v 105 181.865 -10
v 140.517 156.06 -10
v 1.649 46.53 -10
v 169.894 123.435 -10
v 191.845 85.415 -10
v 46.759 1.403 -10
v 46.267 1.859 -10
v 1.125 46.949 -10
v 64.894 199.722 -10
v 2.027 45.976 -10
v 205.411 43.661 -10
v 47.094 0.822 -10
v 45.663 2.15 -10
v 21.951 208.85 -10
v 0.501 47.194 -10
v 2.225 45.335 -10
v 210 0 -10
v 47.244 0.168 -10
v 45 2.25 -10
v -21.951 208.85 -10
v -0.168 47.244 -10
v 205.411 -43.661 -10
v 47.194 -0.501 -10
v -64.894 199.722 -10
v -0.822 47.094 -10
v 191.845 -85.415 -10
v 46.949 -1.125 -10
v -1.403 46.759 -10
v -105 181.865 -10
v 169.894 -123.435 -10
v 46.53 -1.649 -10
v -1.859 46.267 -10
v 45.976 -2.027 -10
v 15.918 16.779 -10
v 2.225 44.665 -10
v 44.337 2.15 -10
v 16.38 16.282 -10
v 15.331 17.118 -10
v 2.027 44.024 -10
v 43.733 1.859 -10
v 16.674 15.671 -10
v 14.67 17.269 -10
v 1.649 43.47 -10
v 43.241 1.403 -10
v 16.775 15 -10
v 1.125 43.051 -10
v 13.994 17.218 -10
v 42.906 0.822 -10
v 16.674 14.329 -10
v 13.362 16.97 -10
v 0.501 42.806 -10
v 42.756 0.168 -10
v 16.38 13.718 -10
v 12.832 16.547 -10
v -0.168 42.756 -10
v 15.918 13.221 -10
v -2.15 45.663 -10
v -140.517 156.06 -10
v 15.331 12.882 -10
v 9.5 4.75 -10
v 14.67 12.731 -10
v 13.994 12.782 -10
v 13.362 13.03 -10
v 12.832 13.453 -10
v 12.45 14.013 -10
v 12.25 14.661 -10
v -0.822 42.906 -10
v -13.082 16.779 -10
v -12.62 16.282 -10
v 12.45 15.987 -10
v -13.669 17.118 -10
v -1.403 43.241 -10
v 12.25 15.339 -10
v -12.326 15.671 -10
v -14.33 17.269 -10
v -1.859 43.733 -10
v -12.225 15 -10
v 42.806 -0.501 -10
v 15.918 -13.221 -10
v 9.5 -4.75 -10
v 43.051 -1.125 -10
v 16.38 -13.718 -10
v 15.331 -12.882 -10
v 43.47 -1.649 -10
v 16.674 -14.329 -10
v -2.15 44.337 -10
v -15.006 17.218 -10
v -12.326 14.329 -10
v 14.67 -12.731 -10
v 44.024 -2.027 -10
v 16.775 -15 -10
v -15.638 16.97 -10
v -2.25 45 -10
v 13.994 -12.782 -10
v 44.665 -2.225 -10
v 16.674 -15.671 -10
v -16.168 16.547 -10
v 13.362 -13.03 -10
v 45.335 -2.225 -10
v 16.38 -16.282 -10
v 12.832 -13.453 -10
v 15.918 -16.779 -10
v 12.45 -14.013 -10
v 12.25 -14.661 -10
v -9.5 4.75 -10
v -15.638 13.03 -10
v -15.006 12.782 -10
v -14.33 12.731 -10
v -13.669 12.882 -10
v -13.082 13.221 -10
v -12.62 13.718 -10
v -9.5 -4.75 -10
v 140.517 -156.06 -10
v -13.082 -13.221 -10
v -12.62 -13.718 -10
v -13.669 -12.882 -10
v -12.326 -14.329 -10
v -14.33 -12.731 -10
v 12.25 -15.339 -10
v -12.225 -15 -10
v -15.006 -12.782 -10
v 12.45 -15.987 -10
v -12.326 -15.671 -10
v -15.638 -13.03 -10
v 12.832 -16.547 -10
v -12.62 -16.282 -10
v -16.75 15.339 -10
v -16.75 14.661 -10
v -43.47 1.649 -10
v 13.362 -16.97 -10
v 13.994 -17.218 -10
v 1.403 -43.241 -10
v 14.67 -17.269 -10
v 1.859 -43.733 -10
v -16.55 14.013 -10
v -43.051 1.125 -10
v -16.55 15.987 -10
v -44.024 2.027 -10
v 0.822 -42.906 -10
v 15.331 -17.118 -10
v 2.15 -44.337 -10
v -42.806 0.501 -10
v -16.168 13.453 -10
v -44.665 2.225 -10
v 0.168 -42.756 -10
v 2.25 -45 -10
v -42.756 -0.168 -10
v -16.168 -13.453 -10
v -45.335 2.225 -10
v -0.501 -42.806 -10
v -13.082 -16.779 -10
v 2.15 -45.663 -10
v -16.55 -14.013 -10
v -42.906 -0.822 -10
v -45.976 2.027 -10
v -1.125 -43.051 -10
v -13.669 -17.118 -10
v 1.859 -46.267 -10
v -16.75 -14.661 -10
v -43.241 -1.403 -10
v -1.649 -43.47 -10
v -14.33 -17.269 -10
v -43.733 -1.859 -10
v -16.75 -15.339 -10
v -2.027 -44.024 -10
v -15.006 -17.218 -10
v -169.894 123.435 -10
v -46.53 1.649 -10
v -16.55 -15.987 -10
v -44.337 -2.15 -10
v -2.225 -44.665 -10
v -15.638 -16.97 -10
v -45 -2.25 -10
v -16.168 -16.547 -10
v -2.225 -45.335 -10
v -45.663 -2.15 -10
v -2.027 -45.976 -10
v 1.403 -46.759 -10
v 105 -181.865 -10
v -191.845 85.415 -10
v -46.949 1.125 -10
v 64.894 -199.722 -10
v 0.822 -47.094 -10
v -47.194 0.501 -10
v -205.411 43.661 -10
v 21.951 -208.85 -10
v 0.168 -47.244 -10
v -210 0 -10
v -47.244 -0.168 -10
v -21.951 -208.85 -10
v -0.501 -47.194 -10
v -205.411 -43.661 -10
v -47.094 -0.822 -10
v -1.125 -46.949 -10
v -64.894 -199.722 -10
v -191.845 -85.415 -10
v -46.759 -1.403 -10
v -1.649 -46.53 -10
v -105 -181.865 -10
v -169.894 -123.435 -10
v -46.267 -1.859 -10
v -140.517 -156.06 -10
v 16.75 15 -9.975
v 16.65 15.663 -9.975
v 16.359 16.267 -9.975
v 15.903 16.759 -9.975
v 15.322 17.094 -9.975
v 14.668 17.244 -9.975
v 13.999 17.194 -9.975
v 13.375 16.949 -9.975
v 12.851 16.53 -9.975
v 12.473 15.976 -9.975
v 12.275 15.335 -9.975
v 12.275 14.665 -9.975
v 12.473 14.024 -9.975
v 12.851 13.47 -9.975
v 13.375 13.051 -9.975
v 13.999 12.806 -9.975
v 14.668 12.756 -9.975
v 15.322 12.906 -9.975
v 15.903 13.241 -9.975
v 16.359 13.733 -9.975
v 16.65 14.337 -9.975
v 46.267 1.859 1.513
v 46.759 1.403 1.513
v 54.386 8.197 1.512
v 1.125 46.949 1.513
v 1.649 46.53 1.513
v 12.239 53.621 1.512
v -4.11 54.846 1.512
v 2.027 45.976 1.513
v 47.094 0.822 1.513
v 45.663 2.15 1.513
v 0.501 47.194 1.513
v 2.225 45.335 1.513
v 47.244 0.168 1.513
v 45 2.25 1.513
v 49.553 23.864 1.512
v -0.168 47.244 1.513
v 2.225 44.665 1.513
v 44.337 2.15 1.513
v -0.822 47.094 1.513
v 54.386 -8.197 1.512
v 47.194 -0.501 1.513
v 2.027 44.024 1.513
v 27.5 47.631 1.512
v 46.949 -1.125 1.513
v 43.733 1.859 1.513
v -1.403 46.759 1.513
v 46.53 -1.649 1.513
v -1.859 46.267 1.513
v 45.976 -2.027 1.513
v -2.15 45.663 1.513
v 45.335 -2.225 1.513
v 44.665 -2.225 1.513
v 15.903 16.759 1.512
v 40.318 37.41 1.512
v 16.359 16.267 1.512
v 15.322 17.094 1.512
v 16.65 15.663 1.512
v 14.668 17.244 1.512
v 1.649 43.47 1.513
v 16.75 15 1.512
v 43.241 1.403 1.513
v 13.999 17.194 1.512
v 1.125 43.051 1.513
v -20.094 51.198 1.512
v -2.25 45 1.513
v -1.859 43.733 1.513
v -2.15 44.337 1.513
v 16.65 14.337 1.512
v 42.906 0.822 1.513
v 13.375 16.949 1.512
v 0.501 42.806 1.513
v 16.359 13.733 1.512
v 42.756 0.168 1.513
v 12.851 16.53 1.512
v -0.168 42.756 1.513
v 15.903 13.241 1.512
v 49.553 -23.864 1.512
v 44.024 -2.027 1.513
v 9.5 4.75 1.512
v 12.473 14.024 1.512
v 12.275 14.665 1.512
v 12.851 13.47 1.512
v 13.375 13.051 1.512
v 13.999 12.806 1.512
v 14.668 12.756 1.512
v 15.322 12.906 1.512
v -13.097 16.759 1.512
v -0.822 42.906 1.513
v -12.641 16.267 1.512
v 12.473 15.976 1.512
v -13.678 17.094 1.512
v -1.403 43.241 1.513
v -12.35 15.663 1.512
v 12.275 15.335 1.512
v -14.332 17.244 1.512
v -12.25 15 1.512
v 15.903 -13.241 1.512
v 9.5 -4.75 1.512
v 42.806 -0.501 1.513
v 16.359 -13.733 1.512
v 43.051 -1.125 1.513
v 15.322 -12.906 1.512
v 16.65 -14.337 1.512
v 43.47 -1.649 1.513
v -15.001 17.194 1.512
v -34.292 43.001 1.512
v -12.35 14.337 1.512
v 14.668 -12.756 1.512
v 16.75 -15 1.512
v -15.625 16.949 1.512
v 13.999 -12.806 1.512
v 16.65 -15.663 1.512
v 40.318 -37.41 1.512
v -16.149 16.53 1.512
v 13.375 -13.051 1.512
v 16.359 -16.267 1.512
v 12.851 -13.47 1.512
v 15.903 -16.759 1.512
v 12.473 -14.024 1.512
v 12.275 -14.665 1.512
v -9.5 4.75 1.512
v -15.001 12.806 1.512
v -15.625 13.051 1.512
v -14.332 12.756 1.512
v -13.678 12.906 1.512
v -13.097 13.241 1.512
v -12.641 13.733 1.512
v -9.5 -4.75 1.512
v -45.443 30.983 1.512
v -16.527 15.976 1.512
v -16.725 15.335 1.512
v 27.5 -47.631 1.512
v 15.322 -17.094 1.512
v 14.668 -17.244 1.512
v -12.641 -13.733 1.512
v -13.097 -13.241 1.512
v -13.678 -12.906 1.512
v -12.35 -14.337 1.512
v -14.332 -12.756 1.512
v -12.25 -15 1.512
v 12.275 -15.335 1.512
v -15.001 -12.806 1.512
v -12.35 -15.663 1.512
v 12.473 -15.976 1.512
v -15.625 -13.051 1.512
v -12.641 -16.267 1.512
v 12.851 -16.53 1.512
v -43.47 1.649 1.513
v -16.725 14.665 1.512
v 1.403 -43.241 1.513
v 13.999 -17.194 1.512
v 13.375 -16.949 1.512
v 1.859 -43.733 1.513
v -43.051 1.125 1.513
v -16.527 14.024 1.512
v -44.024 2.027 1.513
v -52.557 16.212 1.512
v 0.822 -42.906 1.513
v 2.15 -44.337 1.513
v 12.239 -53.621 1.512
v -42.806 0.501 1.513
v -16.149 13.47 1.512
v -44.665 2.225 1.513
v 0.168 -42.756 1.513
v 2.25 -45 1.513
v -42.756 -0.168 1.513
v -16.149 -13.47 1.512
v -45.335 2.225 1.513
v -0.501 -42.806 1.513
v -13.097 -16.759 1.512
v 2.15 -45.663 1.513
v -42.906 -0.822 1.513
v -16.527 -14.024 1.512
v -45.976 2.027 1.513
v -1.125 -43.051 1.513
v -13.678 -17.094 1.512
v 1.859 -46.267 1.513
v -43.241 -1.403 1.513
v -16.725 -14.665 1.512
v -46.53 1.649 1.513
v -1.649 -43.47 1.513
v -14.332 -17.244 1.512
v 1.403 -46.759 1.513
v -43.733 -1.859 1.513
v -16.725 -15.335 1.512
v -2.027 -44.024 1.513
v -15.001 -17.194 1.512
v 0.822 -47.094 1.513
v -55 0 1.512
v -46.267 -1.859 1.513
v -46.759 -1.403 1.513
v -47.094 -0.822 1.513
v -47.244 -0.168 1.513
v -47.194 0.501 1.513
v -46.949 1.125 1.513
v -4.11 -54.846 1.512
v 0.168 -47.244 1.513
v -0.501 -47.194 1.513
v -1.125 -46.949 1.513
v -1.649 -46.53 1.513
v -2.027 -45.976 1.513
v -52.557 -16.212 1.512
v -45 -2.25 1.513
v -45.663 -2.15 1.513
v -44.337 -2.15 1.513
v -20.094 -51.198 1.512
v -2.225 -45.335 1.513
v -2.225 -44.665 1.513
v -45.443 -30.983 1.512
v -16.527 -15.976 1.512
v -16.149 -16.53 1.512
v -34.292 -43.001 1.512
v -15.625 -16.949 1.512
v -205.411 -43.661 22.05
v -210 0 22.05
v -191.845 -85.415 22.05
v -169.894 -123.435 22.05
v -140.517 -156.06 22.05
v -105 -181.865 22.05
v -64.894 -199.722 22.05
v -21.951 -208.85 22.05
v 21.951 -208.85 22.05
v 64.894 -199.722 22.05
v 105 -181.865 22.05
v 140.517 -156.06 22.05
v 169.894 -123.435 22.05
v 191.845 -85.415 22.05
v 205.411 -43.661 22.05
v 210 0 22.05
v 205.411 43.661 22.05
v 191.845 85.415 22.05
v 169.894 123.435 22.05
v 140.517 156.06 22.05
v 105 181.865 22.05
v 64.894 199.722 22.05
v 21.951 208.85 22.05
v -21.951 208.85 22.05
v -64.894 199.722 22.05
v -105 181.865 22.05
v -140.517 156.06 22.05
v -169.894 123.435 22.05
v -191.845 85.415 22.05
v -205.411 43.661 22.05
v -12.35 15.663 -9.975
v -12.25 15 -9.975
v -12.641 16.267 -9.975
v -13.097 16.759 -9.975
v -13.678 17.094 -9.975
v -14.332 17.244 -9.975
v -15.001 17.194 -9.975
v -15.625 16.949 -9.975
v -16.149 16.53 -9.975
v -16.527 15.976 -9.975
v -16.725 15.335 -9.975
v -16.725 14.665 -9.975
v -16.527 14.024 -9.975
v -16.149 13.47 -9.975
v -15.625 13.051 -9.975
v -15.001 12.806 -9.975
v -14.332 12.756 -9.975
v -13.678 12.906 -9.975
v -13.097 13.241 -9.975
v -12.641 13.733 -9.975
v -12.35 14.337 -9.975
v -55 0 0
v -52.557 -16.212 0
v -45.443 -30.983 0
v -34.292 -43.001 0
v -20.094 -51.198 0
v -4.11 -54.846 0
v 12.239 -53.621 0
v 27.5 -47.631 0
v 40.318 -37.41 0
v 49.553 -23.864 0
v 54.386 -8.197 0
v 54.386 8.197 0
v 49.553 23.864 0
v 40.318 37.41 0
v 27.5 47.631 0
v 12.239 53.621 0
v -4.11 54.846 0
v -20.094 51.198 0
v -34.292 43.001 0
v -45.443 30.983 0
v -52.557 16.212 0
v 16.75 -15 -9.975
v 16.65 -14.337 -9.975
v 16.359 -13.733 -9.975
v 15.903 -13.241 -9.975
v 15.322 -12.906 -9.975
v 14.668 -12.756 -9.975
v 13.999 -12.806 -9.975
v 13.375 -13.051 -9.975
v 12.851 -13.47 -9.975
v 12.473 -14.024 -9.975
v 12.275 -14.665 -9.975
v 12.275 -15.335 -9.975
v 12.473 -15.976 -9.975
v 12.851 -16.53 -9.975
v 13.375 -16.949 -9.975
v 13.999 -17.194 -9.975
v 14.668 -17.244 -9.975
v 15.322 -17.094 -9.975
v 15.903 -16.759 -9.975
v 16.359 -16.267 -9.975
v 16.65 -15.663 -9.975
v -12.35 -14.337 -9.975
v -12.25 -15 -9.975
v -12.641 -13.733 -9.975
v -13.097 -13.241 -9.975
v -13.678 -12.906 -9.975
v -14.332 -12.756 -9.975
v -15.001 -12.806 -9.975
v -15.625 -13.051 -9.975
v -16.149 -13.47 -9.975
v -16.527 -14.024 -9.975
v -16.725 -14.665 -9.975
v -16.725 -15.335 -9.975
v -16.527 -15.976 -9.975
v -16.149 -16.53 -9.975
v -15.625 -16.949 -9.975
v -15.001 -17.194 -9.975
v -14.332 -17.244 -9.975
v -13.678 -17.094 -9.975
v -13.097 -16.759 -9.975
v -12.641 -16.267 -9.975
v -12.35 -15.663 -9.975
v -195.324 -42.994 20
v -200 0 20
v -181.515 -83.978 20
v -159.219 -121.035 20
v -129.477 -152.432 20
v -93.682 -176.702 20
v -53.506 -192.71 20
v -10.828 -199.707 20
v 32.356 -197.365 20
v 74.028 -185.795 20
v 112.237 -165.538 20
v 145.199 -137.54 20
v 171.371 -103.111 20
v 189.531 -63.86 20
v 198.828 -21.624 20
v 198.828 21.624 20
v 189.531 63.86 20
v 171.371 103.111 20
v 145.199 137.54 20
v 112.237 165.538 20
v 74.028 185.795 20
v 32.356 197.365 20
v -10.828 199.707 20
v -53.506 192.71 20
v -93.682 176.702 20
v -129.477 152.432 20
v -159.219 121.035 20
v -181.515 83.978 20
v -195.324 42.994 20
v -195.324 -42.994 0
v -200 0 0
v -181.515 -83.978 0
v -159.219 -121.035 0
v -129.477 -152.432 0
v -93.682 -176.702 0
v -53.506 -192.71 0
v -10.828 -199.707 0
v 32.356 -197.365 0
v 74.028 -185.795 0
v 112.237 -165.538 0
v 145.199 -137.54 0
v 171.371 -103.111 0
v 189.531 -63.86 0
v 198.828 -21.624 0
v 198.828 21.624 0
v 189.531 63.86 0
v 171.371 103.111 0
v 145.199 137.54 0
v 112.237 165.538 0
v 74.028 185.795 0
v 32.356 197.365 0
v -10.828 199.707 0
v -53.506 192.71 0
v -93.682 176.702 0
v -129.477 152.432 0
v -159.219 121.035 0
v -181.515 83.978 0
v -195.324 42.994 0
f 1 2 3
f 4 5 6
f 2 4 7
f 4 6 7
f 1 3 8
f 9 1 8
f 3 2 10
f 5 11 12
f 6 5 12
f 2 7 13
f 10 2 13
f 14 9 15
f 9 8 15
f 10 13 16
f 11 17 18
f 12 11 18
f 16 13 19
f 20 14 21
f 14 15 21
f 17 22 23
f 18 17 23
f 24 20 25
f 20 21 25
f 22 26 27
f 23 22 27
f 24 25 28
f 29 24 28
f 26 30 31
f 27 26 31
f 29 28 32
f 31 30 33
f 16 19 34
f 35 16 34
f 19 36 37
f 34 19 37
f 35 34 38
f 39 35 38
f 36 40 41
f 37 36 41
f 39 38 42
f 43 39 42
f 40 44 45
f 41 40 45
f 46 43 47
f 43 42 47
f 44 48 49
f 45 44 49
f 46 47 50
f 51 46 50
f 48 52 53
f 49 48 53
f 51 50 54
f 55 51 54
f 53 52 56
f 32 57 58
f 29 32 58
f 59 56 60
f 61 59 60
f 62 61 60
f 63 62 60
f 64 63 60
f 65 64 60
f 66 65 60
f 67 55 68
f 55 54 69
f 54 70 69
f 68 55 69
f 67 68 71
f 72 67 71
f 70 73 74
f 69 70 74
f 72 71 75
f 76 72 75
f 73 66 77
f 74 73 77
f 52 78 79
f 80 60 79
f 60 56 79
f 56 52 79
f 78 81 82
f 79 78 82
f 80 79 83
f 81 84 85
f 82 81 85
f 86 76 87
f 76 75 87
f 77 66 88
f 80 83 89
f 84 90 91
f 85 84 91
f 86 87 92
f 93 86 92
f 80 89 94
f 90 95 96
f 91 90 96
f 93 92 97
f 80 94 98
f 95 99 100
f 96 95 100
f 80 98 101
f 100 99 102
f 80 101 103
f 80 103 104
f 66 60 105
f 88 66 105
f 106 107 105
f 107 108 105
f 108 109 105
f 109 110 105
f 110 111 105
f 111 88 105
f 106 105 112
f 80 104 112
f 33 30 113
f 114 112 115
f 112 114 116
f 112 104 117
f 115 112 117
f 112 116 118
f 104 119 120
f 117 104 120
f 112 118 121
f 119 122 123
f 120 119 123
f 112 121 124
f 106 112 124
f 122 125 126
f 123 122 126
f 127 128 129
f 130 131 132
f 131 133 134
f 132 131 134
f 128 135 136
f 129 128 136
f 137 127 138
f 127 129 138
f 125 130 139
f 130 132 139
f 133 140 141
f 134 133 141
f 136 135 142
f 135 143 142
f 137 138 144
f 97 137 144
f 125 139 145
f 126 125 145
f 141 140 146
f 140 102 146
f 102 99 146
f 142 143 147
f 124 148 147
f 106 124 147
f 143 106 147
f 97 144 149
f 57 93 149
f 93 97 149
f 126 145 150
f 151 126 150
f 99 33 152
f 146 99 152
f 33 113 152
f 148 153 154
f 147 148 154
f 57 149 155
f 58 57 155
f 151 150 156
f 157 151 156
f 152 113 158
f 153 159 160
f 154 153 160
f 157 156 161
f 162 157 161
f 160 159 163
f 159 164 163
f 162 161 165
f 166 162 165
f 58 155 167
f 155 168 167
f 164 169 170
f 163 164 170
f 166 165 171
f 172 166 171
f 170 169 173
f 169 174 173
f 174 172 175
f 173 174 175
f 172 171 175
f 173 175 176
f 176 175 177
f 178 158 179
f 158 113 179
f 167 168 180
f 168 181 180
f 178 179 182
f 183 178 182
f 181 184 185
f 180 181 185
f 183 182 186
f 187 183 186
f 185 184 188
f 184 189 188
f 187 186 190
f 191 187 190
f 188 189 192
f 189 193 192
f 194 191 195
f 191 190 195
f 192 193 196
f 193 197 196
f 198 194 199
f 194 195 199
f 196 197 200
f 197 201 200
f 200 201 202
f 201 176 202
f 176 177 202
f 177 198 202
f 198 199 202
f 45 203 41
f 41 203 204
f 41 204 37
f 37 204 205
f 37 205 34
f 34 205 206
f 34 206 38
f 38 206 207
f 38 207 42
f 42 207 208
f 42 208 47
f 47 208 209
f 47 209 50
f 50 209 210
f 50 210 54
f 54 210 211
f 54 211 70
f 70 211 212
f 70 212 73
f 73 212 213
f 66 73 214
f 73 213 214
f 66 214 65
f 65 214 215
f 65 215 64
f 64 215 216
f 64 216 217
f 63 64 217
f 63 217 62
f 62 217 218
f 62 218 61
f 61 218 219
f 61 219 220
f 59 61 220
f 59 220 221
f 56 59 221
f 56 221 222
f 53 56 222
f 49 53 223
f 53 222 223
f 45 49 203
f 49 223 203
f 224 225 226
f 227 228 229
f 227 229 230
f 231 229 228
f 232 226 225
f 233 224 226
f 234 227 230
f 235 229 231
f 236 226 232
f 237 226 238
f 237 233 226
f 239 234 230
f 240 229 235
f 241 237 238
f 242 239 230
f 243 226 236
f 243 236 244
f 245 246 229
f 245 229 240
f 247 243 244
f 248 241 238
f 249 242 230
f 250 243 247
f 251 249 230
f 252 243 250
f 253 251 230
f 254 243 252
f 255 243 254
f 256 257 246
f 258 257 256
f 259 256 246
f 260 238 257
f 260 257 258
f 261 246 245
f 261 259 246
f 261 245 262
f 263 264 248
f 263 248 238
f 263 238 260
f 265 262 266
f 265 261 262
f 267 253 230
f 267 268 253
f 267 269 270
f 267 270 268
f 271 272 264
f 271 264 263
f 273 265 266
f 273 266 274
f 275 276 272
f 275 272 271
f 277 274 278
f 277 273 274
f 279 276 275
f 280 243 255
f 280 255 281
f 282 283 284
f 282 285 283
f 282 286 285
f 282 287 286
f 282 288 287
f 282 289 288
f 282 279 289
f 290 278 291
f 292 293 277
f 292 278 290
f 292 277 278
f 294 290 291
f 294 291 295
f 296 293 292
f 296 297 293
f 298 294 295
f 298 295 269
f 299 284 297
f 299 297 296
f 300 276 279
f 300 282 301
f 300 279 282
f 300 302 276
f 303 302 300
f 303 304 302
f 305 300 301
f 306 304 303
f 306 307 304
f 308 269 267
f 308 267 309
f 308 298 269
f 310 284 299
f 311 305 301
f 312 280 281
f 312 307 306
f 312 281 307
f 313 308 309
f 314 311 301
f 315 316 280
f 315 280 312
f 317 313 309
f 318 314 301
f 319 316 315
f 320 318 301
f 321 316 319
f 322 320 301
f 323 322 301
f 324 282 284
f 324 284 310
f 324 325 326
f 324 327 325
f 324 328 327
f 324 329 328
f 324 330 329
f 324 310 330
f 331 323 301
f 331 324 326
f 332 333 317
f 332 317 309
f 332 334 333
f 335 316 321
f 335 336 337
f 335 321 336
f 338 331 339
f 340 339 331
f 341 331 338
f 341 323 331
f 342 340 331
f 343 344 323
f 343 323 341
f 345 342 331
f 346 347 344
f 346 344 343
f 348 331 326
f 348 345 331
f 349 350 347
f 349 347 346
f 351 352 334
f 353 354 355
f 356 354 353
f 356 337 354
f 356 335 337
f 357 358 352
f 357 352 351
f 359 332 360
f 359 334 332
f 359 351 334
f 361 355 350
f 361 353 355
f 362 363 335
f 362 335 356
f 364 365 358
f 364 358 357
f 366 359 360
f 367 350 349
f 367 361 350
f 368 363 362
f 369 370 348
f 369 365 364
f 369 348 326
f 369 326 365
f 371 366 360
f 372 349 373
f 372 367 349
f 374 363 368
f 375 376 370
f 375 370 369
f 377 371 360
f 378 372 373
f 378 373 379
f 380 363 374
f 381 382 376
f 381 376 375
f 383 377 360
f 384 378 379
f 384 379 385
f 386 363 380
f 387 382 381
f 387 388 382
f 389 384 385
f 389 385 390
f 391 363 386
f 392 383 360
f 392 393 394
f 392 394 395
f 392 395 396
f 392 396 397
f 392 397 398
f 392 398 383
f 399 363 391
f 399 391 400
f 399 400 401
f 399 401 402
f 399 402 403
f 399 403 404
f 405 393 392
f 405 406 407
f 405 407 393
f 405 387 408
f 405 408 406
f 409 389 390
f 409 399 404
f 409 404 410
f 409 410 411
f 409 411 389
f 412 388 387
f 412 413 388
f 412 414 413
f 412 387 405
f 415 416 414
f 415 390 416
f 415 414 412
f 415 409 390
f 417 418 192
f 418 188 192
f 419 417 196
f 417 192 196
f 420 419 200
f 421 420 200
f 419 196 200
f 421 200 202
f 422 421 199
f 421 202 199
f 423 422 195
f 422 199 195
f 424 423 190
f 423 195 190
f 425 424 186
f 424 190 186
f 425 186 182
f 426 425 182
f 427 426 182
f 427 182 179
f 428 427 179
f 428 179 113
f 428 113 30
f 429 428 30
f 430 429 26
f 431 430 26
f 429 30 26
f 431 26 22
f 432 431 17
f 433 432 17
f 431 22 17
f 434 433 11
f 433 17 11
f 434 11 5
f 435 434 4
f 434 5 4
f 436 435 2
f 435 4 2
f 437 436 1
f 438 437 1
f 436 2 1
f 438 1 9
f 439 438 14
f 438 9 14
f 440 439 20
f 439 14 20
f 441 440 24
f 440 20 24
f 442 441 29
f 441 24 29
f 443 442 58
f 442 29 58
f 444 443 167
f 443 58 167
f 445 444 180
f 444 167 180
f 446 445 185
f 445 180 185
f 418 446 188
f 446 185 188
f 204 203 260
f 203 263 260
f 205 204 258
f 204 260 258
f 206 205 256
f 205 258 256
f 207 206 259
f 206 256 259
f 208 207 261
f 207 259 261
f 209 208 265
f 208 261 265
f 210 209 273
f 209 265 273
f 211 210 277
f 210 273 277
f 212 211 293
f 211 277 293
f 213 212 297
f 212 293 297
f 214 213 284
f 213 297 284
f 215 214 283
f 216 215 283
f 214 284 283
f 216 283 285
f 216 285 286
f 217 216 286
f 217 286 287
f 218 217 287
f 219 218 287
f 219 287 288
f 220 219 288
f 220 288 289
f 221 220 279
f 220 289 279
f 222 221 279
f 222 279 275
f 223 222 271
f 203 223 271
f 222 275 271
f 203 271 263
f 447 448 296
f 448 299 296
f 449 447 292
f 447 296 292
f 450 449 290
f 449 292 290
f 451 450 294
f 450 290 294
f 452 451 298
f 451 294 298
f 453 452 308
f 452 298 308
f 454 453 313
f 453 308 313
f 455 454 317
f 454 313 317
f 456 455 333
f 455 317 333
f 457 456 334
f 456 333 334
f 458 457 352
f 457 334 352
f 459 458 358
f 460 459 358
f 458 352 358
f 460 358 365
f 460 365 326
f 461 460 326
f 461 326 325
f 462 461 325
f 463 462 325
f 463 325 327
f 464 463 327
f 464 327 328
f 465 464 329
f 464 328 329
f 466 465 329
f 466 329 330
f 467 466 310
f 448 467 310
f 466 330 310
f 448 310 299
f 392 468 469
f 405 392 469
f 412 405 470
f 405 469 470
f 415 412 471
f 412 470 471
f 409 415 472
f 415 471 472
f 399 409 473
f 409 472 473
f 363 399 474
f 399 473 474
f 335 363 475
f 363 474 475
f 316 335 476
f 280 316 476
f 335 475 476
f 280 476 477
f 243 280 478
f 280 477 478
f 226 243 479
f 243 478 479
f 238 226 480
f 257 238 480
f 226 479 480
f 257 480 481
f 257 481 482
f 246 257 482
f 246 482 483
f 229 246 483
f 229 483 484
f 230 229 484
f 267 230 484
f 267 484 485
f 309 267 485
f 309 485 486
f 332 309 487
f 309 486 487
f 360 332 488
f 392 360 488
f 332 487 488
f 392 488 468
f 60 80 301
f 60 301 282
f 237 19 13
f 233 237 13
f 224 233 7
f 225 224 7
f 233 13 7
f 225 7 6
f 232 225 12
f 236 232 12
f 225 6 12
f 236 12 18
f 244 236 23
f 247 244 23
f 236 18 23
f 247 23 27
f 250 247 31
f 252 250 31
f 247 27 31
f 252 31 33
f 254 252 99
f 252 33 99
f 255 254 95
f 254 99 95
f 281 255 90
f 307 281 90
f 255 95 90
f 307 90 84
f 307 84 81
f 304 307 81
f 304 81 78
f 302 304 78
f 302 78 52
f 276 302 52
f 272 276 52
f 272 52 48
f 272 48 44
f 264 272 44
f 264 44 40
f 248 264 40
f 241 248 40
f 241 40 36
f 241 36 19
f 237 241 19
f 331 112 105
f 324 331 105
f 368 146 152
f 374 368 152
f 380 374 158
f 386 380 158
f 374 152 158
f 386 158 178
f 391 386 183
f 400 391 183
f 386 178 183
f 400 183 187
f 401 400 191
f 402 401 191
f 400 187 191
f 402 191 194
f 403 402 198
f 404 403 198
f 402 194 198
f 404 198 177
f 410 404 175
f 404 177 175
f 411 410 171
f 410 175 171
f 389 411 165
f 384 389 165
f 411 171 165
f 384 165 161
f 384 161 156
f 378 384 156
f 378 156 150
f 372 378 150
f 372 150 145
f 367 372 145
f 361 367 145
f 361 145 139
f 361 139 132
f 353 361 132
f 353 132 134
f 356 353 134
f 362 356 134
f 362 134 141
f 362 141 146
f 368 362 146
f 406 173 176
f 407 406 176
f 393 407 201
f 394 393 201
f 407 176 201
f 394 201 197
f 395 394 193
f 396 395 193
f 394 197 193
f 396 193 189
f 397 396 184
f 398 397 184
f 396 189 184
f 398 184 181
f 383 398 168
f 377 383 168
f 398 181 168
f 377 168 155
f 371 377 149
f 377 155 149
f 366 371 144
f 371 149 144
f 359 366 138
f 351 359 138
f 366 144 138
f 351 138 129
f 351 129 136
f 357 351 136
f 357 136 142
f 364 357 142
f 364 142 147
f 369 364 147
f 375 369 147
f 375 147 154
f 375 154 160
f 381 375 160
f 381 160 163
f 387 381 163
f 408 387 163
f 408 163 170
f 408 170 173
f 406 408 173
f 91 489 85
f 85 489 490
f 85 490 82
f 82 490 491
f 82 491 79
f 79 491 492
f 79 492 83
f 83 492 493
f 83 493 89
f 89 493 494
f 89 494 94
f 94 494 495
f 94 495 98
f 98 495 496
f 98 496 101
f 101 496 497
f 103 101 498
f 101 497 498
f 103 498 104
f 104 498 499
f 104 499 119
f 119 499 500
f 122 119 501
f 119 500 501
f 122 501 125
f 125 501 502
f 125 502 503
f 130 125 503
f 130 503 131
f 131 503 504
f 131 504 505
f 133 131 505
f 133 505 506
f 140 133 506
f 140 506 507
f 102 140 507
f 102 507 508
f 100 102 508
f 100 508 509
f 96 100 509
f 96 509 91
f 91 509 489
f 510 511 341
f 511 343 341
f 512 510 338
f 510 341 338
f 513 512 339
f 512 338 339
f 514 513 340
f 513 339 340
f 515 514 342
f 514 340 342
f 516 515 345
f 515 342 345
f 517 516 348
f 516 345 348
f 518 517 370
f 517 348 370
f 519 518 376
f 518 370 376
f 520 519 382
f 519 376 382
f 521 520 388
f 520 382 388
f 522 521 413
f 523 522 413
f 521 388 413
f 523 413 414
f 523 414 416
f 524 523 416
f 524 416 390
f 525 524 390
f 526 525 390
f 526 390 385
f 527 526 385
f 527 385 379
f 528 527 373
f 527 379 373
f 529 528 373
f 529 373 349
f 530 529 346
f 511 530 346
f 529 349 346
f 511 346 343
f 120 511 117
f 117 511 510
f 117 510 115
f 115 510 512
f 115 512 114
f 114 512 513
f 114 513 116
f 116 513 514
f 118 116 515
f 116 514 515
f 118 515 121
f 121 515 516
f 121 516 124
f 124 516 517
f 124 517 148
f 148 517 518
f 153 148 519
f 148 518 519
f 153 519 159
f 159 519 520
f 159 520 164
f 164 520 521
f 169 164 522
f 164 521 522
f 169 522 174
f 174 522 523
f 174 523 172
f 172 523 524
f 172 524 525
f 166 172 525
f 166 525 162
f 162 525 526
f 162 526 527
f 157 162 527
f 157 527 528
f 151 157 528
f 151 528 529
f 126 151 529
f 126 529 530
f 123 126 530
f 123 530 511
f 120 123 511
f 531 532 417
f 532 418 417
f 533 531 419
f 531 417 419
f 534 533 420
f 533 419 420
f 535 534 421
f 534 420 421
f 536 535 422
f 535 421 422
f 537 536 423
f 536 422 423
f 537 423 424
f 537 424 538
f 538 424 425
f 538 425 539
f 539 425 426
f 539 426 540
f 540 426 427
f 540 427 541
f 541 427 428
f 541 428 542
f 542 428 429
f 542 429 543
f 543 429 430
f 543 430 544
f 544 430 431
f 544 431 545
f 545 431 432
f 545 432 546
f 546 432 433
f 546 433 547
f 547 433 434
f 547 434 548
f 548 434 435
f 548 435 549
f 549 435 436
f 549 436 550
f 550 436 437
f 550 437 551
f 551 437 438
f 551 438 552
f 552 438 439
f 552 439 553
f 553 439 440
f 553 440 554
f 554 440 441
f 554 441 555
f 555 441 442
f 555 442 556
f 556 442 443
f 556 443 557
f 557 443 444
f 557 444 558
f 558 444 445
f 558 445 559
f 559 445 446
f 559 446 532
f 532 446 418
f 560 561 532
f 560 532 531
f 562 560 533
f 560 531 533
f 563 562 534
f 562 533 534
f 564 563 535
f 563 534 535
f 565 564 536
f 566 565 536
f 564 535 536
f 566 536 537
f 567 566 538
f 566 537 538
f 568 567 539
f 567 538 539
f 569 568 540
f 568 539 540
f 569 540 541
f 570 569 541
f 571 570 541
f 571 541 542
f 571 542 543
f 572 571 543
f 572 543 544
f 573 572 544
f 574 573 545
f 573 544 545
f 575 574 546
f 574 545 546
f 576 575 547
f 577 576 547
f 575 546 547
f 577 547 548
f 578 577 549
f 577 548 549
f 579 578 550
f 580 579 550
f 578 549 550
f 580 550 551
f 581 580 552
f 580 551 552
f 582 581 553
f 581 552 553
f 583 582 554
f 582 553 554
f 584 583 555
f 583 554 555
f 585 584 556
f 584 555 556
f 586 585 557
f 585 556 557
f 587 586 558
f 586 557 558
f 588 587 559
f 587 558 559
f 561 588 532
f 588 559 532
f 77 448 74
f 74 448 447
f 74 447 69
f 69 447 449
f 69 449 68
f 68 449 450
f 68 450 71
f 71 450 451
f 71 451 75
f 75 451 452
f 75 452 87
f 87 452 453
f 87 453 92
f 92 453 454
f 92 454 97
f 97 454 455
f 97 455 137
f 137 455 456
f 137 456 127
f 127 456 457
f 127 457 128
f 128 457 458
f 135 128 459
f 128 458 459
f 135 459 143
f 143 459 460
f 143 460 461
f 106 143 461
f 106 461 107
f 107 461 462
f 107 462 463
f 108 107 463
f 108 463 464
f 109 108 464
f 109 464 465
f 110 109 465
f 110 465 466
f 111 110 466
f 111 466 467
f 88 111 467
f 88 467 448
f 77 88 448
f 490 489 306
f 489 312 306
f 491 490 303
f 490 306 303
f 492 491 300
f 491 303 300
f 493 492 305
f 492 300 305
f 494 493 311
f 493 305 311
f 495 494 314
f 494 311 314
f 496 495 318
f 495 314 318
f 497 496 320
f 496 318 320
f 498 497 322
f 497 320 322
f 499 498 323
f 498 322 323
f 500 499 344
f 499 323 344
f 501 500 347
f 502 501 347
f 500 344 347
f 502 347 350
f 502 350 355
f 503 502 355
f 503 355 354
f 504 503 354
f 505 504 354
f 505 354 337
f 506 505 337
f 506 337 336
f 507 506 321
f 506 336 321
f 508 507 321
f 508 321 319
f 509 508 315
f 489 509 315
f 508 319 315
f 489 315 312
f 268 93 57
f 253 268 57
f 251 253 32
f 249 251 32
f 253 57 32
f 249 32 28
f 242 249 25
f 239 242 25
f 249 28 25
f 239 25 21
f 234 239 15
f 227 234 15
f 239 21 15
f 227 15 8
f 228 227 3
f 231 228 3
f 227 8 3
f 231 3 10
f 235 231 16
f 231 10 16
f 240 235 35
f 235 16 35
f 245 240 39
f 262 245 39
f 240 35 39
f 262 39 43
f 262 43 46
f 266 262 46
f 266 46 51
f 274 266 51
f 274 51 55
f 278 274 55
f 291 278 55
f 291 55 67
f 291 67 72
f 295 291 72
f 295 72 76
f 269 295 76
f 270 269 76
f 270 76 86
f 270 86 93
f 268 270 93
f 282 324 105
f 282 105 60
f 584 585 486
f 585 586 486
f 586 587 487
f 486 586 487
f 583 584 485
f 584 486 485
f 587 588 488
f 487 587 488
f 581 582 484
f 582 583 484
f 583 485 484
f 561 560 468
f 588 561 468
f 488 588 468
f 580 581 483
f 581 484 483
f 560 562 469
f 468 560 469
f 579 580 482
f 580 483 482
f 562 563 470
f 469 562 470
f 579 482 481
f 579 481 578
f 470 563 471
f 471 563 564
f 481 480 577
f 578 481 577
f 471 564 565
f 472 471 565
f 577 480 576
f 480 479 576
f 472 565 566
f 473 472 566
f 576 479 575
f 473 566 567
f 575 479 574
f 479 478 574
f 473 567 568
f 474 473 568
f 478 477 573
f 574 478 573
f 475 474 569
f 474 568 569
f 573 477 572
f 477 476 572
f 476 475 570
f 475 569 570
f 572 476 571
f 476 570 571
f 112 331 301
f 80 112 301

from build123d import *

# Parameters (mm, degrees)
CUT_EXTRUDE_1_DEPTH         = 298.8022876
CUT_EXTRUDE_1_DEPTH_BACK    = 298.8022876
SKETCH_2_W                  = 19
SKETCH_2_H                  = 9.5
SKETCH_3_R                  = 55
EXTRUDE_1_DEPTH             = 1.5125
SKETCH_4_W                  = 19
SKETCH_4_H                  = 9.5
CUT_EXTRUDE_2_DEPTH         = 2
HOLE_WIZARD_M41_D           = 4.5
PATTERN_CIRCULAR_1_COUNT    = 4
HOLE_WIZARD_M42_D           = 4.5
HOLE_WIZARD_M42_CSINK_D     = 4.55
HOLE_WIZARD_M42_CSINK_ANGLE = 90


with BuildPart() as part:
    # Эскиз1 → Повернуть1 (revolve)
    with BuildSketch(Plane(origin=(0, 0, 0), x_dir=(1, 0, 0), z_dir=(0, 1, 0)), mode=Mode.PRIVATE) as revolve_1_sk:
        Polygon((0, 0), (200, 0), (200, -20), (210, -22.05), (210, 10), (0, 10), align=None)
    revolve(revolve_1_sk.sketch.rotate(Axis((0, 0, -10), (0, 0, 1)), 180), axis=Axis((0, 0, -10), (0, 0, 1)))

    # Эскиз2 → Вырез-Вытянуть1 (cut, two sides: drawn at the far end of the back side and taken through both)
    with BuildSketch(Plane.XY.offset(-CUT_EXTRUDE_1_DEPTH_BACK)):
        Rectangle(SKETCH_2_W, SKETCH_2_H)
    extrude(amount=CUT_EXTRUDE_1_DEPTH + CUT_EXTRUDE_1_DEPTH_BACK, mode=Mode.SUBTRACT)

    # Эскиз3 → Бобышка-Вытянуть1 (add)
    with BuildSketch(Plane.XY):
        with Locations(Location((0, 0, 0), (0, 0, 180))):
            Circle(SKETCH_3_R)
    extrude(amount=EXTRUDE_1_DEPTH)

    # Эскиз4 → Вырез-Вытянуть2 (cut)
    with BuildSketch(Plane.XY.offset(1.5125)):
        Rectangle(SKETCH_4_W, SKETCH_4_H)
    extrude(amount=-CUT_EXTRUDE_2_DEPTH, mode=Mode.SUBTRACT)

    # Отверстие с зазором M41 (through all)
    with Locations(Plane(origin=(0, 45, 1.5125), x_dir=(1, 0, 0), z_dir=(0, 0, 1))):
        with Locations((0, 0)):
            hole_wizard_m41 = Hole(HOLE_WIZARD_M41_D / 2)

    # Круговой массив1: Отверстие с зазором M41 ×4 about axis
    pattern_circular_1_axis = Axis((0, 0, 0), (0, 0, 1))
    for i in range(1, PATTERN_CIRCULAR_1_COUNT):
        add(hole_wizard_m41.rotate(pattern_circular_1_axis, i * 360 / PATTERN_CIRCULAR_1_COUNT), mode=Mode.SUBTRACT)

    # Отверстие с зазором M42 (through all)
    with Locations(Plane(origin=(-14.5, 15, -10), x_dir=(-1, 0, 0), z_dir=(0, 0, -1))):
        with Locations((0, 0), (-29, 0), (-29, -30), (0, -30)):
            CounterSinkHole(HOLE_WIZARD_M42_D / 2, HOLE_WIZARD_M42_CSINK_D / 2, counter_sink_angle=HOLE_WIZARD_M42_CSINK_ANGLE)


solid = part.part
